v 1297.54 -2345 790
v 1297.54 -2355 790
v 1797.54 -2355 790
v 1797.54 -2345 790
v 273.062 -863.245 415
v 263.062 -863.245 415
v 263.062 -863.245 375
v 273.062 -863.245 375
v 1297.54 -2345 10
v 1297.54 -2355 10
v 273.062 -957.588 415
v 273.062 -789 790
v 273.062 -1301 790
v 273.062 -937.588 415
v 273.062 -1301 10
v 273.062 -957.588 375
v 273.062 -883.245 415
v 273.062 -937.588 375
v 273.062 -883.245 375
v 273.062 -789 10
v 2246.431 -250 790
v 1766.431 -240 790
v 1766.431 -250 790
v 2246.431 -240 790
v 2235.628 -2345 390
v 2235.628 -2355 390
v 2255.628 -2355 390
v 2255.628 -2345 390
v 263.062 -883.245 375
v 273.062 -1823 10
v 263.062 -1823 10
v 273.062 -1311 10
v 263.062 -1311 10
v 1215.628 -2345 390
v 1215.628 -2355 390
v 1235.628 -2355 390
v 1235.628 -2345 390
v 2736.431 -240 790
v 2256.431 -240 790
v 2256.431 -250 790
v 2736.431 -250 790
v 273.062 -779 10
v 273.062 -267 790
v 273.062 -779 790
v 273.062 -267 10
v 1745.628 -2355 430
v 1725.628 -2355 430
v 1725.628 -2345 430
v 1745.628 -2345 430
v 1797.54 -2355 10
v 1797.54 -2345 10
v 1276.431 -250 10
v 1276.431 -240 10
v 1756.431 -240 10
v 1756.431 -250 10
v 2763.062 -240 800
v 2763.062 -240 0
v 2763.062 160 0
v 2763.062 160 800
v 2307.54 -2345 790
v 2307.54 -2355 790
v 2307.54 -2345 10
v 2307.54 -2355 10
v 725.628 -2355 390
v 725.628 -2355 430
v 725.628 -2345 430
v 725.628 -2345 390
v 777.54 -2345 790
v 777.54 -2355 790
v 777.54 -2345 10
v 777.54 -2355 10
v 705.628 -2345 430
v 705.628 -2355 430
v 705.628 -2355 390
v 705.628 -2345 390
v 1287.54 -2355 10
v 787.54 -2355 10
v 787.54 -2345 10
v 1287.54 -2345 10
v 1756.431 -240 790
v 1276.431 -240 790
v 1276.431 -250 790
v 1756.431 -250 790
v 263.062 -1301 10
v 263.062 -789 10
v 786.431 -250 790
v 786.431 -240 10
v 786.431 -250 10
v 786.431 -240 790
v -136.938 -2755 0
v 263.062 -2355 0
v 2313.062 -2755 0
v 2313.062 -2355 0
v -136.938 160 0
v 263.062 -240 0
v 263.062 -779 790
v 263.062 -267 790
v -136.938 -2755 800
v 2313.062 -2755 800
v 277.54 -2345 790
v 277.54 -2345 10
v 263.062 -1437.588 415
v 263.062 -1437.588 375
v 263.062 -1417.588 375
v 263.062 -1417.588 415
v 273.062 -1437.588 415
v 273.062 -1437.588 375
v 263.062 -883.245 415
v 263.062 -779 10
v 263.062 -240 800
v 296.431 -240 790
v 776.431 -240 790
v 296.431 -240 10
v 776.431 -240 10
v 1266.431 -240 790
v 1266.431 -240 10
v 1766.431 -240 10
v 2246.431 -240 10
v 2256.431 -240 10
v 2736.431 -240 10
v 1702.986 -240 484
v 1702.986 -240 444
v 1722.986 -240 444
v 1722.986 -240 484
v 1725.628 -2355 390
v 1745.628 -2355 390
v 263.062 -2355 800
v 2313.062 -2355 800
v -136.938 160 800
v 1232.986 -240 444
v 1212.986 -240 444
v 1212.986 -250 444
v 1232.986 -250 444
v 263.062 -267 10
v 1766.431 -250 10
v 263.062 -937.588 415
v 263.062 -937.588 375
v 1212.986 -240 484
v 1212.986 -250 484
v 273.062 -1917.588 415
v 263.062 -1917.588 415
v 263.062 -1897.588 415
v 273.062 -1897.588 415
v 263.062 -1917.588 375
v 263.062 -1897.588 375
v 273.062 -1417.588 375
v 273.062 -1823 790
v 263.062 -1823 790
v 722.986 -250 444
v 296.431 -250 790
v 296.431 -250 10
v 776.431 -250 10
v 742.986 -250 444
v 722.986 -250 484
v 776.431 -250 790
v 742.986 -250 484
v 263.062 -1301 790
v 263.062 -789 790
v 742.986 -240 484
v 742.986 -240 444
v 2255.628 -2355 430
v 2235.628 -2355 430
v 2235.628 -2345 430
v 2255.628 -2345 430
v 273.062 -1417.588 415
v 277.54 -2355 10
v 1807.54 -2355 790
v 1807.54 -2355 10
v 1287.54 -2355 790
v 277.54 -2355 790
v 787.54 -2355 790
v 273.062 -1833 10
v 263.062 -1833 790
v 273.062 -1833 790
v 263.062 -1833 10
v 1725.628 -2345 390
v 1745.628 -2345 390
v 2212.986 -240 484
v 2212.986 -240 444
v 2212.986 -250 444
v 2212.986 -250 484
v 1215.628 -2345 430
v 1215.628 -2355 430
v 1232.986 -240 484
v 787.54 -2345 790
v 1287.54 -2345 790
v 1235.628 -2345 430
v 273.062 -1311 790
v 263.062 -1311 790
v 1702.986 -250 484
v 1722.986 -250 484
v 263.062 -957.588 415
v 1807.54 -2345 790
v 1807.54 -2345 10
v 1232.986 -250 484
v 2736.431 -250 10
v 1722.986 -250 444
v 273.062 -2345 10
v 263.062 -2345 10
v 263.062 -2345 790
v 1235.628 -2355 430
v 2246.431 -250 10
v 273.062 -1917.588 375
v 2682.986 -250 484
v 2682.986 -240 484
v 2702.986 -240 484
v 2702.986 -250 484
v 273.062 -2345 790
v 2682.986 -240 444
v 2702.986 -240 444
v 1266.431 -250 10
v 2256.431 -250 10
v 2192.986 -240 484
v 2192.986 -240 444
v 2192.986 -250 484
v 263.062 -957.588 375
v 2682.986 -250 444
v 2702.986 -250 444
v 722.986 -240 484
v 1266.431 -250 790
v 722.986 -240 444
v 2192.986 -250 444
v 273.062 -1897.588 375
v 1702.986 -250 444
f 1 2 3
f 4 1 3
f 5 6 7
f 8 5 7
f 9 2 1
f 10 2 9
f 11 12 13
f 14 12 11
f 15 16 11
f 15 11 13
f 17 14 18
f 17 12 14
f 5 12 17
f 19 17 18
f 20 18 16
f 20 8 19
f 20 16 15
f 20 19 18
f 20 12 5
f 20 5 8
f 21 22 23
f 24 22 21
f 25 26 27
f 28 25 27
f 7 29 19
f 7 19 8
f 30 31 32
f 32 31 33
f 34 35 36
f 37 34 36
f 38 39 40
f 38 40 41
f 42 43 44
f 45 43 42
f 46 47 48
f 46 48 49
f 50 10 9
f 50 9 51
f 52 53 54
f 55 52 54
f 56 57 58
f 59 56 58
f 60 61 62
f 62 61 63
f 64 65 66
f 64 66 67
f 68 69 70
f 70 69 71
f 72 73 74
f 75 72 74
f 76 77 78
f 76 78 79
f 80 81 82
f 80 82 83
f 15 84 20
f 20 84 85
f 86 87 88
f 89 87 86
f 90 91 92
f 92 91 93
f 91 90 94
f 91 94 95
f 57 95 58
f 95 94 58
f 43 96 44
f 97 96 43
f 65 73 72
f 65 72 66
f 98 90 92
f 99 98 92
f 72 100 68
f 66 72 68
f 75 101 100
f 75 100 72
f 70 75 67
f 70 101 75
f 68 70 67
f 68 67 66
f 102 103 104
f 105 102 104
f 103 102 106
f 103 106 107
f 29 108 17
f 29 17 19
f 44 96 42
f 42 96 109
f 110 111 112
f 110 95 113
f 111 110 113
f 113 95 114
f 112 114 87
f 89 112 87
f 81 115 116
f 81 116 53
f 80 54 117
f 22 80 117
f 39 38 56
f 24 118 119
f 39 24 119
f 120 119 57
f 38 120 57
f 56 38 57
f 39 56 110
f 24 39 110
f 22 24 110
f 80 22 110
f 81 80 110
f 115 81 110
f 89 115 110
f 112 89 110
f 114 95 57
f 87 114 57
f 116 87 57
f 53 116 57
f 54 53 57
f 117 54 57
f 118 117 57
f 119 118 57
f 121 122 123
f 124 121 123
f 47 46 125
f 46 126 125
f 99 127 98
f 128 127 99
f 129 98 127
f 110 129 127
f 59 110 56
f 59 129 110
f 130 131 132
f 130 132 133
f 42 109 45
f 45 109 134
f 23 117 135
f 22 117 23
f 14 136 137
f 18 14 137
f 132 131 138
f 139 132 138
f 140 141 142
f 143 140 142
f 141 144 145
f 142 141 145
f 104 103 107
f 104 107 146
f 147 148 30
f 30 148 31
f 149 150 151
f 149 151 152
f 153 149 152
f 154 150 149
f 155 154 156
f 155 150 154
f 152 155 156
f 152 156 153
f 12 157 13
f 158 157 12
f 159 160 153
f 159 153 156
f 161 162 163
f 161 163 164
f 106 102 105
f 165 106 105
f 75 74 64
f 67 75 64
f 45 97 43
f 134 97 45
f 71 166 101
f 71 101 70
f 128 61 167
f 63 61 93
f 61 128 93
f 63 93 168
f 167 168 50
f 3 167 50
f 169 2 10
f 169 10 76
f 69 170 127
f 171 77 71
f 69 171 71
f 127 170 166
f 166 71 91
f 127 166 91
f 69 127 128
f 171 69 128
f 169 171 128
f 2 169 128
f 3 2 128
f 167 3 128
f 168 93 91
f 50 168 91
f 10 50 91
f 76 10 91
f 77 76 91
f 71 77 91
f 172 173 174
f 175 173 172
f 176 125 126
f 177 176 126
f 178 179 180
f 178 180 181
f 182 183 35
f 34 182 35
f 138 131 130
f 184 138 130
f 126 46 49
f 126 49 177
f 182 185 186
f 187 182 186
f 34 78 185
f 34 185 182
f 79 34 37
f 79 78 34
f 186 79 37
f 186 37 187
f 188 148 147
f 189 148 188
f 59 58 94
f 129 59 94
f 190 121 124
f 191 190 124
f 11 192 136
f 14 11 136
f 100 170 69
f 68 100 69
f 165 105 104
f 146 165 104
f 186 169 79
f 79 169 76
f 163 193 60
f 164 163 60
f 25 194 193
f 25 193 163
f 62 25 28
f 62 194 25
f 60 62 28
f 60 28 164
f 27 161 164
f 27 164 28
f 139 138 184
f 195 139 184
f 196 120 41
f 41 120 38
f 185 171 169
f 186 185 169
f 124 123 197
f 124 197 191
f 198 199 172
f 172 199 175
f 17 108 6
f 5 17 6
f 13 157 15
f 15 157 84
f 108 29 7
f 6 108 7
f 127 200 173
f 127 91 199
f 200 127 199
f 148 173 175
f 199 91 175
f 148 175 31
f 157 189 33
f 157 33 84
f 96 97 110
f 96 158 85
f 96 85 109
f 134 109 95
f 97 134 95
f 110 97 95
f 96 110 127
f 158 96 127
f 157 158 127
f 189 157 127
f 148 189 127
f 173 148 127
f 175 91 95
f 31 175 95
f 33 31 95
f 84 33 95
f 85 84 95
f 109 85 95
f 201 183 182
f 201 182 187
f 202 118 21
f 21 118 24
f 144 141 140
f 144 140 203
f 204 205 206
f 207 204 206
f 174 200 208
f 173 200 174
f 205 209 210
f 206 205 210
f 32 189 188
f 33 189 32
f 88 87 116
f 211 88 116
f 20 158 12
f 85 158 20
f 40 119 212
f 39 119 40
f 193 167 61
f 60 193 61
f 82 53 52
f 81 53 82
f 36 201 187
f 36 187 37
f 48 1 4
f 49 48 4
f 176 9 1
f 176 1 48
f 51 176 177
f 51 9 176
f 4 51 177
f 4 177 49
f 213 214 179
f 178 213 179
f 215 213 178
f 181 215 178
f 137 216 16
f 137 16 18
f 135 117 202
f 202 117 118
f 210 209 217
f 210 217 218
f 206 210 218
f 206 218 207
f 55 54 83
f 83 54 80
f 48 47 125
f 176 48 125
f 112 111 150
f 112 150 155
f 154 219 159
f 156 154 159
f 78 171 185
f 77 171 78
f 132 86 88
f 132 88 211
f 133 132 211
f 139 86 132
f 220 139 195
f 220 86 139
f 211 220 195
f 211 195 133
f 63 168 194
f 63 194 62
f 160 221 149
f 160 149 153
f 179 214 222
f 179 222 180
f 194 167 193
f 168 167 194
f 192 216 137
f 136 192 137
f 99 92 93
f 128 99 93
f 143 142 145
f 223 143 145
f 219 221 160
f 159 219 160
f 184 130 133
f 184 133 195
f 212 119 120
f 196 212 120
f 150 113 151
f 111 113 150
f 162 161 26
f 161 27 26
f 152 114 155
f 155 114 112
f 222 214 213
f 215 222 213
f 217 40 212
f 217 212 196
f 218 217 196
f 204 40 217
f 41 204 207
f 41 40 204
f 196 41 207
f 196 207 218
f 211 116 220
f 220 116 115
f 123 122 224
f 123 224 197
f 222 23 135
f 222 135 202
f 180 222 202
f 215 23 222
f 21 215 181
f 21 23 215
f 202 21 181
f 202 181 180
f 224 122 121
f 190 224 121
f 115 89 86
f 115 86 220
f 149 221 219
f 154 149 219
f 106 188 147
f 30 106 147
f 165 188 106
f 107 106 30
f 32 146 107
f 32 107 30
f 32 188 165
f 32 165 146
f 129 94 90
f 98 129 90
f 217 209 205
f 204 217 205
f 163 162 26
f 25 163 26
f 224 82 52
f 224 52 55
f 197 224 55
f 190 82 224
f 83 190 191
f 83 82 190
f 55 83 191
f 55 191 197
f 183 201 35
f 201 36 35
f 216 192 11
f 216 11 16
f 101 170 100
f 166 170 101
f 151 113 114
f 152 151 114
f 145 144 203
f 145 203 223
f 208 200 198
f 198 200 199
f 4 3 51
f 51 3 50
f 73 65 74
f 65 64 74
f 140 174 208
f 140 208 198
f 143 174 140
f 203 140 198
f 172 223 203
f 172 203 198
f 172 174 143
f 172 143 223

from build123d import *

# Parameters (mm, degrees)
BOSS_EXTRUDE1_DEPTH = 800
SKETCH2_W           = 500
SKETCH2_H           = 780
SKETCH2_W_2         = 20
SKETCH2_H_2         = 40
BOSS_EXTRUDE2_DEPTH = 10
SKETCH3_W           = 780
SKETCH3_H           = 512
SKETCH3_W_2         = 40
SKETCH3_H_2         = 20
BOSS_EXTRUDE3_DEPTH = 10
SKETCH4_W           = 480
SKETCH4_H           = 780
SKETCH4_W_2         = 20
SKETCH4_H_2         = 40
BOSS_EXTRUDE4_DEPTH = 10


with BuildPart() as part:
    # Sketch1 → Boss-Extrude1 (new body)
    with BuildSketch(Plane.XY):
        Polygon((2763.061970043, 160), (-136.938029957, 160), (-136.938029957, -2755), (2313.061970043, -2755), (2313.061970043, -2355), (263.061970043, -2355), (263.061970043, -240), (2763.061970043, -240), align=None)
    extrude(amount=BOSS_EXTRUDE1_DEPTH)

    # Sketch2 → Boss-Extrude2 (add)
    with BuildSketch(Plane(origin=(0, -2355, 0), x_dir=(1, 0, 0), z_dir=(0, 1, 0))):
        with Locations((1037.540108644, -400)):
            Rectangle(SKETCH2_W, SKETCH2_H)
        with Locations((1225.627674913, -410)):
            Rectangle(SKETCH2_W_2, SKETCH2_H_2, mode=Mode.SUBTRACT)
        with Locations((527.540108644, -400)):
            Rectangle(SKETCH2_W, SKETCH2_H)
        with Locations((715.627674913, -410)):
            Rectangle(SKETCH2_W_2, SKETCH2_H_2, mode=Mode.SUBTRACT)
        with Locations((1547.540108644, -400)):
            Rectangle(SKETCH2_W, SKETCH2_H)
        with Locations((1735.627674913, -410)):
            Rectangle(SKETCH2_W_2, SKETCH2_H_2, mode=Mode.SUBTRACT)
        with Locations((2057.540108644, -400)):
            Rectangle(SKETCH2_W, SKETCH2_H)
        with Locations((2245.627674913, -410)):
            Rectangle(SKETCH2_W_2, SKETCH2_H_2, mode=Mode.SUBTRACT)
    extrude(amount=BOSS_EXTRUDE2_DEPTH)

    # Sketch3 → Boss-Extrude3 (add)
    with BuildSketch(Plane(origin=(263.061970043, 0, 0), x_dir=(0, 0, -1), z_dir=(1, 0, 0))):
        with Locations((-400, -1567)):
            Rectangle(SKETCH3_W, SKETCH3_H)
        with Locations((-395, -1427.588446785)):
            Rectangle(SKETCH3_W_2, SKETCH3_H_2, mode=Mode.SUBTRACT)
        with Locations((-400, -2089)):
            Rectangle(SKETCH3_W, SKETCH3_H)
        with Locations((-395, -1907.588446785)):
            Rectangle(SKETCH3_W_2, SKETCH3_H_2, mode=Mode.SUBTRACT)
        with Locations((-400, -1045)):
            Rectangle(SKETCH3_W, SKETCH3_H)
        with Locations((-395, -947.588446785)):
            Rectangle(SKETCH3_W_2, SKETCH3_H_2, mode=Mode.SUBTRACT)
        with Locations((-395, -873.244551229)):
            Rectangle(SKETCH3_W_2, SKETCH3_H_2, mode=Mode.SUBTRACT)
        with Locations((-400, -523)):
            Rectangle(SKETCH3_W, SKETCH3_H)
    extrude(amount=BOSS_EXTRUDE3_DEPTH)

    # Sketch4 → Boss-Extrude4 (add)
    with BuildSketch(Plane.XZ.offset(240)):
        with Locations((536.430909258, 400)):
            Rectangle(SKETCH4_W, SKETCH4_H)
        with Locations((732.985950251, 464)):
            Rectangle(SKETCH4_W_2, SKETCH4_H_2, mode=Mode.SUBTRACT)
        with Locations((1516.430909258, 400)):
            Rectangle(SKETCH4_W, SKETCH4_H)
        with Locations((1712.985950251, 464)):
            Rectangle(SKETCH4_W_2, SKETCH4_H_2, mode=Mode.SUBTRACT)
        with Locations((2006.430909258, 400)):
            Rectangle(SKETCH4_W, SKETCH4_H)
        with Locations((2202.985950251, 464)):
            Rectangle(SKETCH4_W_2, SKETCH4_H_2, mode=Mode.SUBTRACT)
        with Locations((2496.430909258, 400)):
            Rectangle(SKETCH4_W, SKETCH4_H)
        with Locations((2692.985950251, 464)):
            Rectangle(SKETCH4_W_2, SKETCH4_H_2, mode=Mode.SUBTRACT)
        with Locations((1026.430909258, 400)):
            Rectangle(SKETCH4_W, SKETCH4_H)
        with Locations((1222.985950251, 464)):
            Rectangle(SKETCH4_W_2, SKETCH4_H_2, mode=Mode.SUBTRACT)
    extrude(amount=BOSS_EXTRUDE4_DEPTH)


solid = part.part
